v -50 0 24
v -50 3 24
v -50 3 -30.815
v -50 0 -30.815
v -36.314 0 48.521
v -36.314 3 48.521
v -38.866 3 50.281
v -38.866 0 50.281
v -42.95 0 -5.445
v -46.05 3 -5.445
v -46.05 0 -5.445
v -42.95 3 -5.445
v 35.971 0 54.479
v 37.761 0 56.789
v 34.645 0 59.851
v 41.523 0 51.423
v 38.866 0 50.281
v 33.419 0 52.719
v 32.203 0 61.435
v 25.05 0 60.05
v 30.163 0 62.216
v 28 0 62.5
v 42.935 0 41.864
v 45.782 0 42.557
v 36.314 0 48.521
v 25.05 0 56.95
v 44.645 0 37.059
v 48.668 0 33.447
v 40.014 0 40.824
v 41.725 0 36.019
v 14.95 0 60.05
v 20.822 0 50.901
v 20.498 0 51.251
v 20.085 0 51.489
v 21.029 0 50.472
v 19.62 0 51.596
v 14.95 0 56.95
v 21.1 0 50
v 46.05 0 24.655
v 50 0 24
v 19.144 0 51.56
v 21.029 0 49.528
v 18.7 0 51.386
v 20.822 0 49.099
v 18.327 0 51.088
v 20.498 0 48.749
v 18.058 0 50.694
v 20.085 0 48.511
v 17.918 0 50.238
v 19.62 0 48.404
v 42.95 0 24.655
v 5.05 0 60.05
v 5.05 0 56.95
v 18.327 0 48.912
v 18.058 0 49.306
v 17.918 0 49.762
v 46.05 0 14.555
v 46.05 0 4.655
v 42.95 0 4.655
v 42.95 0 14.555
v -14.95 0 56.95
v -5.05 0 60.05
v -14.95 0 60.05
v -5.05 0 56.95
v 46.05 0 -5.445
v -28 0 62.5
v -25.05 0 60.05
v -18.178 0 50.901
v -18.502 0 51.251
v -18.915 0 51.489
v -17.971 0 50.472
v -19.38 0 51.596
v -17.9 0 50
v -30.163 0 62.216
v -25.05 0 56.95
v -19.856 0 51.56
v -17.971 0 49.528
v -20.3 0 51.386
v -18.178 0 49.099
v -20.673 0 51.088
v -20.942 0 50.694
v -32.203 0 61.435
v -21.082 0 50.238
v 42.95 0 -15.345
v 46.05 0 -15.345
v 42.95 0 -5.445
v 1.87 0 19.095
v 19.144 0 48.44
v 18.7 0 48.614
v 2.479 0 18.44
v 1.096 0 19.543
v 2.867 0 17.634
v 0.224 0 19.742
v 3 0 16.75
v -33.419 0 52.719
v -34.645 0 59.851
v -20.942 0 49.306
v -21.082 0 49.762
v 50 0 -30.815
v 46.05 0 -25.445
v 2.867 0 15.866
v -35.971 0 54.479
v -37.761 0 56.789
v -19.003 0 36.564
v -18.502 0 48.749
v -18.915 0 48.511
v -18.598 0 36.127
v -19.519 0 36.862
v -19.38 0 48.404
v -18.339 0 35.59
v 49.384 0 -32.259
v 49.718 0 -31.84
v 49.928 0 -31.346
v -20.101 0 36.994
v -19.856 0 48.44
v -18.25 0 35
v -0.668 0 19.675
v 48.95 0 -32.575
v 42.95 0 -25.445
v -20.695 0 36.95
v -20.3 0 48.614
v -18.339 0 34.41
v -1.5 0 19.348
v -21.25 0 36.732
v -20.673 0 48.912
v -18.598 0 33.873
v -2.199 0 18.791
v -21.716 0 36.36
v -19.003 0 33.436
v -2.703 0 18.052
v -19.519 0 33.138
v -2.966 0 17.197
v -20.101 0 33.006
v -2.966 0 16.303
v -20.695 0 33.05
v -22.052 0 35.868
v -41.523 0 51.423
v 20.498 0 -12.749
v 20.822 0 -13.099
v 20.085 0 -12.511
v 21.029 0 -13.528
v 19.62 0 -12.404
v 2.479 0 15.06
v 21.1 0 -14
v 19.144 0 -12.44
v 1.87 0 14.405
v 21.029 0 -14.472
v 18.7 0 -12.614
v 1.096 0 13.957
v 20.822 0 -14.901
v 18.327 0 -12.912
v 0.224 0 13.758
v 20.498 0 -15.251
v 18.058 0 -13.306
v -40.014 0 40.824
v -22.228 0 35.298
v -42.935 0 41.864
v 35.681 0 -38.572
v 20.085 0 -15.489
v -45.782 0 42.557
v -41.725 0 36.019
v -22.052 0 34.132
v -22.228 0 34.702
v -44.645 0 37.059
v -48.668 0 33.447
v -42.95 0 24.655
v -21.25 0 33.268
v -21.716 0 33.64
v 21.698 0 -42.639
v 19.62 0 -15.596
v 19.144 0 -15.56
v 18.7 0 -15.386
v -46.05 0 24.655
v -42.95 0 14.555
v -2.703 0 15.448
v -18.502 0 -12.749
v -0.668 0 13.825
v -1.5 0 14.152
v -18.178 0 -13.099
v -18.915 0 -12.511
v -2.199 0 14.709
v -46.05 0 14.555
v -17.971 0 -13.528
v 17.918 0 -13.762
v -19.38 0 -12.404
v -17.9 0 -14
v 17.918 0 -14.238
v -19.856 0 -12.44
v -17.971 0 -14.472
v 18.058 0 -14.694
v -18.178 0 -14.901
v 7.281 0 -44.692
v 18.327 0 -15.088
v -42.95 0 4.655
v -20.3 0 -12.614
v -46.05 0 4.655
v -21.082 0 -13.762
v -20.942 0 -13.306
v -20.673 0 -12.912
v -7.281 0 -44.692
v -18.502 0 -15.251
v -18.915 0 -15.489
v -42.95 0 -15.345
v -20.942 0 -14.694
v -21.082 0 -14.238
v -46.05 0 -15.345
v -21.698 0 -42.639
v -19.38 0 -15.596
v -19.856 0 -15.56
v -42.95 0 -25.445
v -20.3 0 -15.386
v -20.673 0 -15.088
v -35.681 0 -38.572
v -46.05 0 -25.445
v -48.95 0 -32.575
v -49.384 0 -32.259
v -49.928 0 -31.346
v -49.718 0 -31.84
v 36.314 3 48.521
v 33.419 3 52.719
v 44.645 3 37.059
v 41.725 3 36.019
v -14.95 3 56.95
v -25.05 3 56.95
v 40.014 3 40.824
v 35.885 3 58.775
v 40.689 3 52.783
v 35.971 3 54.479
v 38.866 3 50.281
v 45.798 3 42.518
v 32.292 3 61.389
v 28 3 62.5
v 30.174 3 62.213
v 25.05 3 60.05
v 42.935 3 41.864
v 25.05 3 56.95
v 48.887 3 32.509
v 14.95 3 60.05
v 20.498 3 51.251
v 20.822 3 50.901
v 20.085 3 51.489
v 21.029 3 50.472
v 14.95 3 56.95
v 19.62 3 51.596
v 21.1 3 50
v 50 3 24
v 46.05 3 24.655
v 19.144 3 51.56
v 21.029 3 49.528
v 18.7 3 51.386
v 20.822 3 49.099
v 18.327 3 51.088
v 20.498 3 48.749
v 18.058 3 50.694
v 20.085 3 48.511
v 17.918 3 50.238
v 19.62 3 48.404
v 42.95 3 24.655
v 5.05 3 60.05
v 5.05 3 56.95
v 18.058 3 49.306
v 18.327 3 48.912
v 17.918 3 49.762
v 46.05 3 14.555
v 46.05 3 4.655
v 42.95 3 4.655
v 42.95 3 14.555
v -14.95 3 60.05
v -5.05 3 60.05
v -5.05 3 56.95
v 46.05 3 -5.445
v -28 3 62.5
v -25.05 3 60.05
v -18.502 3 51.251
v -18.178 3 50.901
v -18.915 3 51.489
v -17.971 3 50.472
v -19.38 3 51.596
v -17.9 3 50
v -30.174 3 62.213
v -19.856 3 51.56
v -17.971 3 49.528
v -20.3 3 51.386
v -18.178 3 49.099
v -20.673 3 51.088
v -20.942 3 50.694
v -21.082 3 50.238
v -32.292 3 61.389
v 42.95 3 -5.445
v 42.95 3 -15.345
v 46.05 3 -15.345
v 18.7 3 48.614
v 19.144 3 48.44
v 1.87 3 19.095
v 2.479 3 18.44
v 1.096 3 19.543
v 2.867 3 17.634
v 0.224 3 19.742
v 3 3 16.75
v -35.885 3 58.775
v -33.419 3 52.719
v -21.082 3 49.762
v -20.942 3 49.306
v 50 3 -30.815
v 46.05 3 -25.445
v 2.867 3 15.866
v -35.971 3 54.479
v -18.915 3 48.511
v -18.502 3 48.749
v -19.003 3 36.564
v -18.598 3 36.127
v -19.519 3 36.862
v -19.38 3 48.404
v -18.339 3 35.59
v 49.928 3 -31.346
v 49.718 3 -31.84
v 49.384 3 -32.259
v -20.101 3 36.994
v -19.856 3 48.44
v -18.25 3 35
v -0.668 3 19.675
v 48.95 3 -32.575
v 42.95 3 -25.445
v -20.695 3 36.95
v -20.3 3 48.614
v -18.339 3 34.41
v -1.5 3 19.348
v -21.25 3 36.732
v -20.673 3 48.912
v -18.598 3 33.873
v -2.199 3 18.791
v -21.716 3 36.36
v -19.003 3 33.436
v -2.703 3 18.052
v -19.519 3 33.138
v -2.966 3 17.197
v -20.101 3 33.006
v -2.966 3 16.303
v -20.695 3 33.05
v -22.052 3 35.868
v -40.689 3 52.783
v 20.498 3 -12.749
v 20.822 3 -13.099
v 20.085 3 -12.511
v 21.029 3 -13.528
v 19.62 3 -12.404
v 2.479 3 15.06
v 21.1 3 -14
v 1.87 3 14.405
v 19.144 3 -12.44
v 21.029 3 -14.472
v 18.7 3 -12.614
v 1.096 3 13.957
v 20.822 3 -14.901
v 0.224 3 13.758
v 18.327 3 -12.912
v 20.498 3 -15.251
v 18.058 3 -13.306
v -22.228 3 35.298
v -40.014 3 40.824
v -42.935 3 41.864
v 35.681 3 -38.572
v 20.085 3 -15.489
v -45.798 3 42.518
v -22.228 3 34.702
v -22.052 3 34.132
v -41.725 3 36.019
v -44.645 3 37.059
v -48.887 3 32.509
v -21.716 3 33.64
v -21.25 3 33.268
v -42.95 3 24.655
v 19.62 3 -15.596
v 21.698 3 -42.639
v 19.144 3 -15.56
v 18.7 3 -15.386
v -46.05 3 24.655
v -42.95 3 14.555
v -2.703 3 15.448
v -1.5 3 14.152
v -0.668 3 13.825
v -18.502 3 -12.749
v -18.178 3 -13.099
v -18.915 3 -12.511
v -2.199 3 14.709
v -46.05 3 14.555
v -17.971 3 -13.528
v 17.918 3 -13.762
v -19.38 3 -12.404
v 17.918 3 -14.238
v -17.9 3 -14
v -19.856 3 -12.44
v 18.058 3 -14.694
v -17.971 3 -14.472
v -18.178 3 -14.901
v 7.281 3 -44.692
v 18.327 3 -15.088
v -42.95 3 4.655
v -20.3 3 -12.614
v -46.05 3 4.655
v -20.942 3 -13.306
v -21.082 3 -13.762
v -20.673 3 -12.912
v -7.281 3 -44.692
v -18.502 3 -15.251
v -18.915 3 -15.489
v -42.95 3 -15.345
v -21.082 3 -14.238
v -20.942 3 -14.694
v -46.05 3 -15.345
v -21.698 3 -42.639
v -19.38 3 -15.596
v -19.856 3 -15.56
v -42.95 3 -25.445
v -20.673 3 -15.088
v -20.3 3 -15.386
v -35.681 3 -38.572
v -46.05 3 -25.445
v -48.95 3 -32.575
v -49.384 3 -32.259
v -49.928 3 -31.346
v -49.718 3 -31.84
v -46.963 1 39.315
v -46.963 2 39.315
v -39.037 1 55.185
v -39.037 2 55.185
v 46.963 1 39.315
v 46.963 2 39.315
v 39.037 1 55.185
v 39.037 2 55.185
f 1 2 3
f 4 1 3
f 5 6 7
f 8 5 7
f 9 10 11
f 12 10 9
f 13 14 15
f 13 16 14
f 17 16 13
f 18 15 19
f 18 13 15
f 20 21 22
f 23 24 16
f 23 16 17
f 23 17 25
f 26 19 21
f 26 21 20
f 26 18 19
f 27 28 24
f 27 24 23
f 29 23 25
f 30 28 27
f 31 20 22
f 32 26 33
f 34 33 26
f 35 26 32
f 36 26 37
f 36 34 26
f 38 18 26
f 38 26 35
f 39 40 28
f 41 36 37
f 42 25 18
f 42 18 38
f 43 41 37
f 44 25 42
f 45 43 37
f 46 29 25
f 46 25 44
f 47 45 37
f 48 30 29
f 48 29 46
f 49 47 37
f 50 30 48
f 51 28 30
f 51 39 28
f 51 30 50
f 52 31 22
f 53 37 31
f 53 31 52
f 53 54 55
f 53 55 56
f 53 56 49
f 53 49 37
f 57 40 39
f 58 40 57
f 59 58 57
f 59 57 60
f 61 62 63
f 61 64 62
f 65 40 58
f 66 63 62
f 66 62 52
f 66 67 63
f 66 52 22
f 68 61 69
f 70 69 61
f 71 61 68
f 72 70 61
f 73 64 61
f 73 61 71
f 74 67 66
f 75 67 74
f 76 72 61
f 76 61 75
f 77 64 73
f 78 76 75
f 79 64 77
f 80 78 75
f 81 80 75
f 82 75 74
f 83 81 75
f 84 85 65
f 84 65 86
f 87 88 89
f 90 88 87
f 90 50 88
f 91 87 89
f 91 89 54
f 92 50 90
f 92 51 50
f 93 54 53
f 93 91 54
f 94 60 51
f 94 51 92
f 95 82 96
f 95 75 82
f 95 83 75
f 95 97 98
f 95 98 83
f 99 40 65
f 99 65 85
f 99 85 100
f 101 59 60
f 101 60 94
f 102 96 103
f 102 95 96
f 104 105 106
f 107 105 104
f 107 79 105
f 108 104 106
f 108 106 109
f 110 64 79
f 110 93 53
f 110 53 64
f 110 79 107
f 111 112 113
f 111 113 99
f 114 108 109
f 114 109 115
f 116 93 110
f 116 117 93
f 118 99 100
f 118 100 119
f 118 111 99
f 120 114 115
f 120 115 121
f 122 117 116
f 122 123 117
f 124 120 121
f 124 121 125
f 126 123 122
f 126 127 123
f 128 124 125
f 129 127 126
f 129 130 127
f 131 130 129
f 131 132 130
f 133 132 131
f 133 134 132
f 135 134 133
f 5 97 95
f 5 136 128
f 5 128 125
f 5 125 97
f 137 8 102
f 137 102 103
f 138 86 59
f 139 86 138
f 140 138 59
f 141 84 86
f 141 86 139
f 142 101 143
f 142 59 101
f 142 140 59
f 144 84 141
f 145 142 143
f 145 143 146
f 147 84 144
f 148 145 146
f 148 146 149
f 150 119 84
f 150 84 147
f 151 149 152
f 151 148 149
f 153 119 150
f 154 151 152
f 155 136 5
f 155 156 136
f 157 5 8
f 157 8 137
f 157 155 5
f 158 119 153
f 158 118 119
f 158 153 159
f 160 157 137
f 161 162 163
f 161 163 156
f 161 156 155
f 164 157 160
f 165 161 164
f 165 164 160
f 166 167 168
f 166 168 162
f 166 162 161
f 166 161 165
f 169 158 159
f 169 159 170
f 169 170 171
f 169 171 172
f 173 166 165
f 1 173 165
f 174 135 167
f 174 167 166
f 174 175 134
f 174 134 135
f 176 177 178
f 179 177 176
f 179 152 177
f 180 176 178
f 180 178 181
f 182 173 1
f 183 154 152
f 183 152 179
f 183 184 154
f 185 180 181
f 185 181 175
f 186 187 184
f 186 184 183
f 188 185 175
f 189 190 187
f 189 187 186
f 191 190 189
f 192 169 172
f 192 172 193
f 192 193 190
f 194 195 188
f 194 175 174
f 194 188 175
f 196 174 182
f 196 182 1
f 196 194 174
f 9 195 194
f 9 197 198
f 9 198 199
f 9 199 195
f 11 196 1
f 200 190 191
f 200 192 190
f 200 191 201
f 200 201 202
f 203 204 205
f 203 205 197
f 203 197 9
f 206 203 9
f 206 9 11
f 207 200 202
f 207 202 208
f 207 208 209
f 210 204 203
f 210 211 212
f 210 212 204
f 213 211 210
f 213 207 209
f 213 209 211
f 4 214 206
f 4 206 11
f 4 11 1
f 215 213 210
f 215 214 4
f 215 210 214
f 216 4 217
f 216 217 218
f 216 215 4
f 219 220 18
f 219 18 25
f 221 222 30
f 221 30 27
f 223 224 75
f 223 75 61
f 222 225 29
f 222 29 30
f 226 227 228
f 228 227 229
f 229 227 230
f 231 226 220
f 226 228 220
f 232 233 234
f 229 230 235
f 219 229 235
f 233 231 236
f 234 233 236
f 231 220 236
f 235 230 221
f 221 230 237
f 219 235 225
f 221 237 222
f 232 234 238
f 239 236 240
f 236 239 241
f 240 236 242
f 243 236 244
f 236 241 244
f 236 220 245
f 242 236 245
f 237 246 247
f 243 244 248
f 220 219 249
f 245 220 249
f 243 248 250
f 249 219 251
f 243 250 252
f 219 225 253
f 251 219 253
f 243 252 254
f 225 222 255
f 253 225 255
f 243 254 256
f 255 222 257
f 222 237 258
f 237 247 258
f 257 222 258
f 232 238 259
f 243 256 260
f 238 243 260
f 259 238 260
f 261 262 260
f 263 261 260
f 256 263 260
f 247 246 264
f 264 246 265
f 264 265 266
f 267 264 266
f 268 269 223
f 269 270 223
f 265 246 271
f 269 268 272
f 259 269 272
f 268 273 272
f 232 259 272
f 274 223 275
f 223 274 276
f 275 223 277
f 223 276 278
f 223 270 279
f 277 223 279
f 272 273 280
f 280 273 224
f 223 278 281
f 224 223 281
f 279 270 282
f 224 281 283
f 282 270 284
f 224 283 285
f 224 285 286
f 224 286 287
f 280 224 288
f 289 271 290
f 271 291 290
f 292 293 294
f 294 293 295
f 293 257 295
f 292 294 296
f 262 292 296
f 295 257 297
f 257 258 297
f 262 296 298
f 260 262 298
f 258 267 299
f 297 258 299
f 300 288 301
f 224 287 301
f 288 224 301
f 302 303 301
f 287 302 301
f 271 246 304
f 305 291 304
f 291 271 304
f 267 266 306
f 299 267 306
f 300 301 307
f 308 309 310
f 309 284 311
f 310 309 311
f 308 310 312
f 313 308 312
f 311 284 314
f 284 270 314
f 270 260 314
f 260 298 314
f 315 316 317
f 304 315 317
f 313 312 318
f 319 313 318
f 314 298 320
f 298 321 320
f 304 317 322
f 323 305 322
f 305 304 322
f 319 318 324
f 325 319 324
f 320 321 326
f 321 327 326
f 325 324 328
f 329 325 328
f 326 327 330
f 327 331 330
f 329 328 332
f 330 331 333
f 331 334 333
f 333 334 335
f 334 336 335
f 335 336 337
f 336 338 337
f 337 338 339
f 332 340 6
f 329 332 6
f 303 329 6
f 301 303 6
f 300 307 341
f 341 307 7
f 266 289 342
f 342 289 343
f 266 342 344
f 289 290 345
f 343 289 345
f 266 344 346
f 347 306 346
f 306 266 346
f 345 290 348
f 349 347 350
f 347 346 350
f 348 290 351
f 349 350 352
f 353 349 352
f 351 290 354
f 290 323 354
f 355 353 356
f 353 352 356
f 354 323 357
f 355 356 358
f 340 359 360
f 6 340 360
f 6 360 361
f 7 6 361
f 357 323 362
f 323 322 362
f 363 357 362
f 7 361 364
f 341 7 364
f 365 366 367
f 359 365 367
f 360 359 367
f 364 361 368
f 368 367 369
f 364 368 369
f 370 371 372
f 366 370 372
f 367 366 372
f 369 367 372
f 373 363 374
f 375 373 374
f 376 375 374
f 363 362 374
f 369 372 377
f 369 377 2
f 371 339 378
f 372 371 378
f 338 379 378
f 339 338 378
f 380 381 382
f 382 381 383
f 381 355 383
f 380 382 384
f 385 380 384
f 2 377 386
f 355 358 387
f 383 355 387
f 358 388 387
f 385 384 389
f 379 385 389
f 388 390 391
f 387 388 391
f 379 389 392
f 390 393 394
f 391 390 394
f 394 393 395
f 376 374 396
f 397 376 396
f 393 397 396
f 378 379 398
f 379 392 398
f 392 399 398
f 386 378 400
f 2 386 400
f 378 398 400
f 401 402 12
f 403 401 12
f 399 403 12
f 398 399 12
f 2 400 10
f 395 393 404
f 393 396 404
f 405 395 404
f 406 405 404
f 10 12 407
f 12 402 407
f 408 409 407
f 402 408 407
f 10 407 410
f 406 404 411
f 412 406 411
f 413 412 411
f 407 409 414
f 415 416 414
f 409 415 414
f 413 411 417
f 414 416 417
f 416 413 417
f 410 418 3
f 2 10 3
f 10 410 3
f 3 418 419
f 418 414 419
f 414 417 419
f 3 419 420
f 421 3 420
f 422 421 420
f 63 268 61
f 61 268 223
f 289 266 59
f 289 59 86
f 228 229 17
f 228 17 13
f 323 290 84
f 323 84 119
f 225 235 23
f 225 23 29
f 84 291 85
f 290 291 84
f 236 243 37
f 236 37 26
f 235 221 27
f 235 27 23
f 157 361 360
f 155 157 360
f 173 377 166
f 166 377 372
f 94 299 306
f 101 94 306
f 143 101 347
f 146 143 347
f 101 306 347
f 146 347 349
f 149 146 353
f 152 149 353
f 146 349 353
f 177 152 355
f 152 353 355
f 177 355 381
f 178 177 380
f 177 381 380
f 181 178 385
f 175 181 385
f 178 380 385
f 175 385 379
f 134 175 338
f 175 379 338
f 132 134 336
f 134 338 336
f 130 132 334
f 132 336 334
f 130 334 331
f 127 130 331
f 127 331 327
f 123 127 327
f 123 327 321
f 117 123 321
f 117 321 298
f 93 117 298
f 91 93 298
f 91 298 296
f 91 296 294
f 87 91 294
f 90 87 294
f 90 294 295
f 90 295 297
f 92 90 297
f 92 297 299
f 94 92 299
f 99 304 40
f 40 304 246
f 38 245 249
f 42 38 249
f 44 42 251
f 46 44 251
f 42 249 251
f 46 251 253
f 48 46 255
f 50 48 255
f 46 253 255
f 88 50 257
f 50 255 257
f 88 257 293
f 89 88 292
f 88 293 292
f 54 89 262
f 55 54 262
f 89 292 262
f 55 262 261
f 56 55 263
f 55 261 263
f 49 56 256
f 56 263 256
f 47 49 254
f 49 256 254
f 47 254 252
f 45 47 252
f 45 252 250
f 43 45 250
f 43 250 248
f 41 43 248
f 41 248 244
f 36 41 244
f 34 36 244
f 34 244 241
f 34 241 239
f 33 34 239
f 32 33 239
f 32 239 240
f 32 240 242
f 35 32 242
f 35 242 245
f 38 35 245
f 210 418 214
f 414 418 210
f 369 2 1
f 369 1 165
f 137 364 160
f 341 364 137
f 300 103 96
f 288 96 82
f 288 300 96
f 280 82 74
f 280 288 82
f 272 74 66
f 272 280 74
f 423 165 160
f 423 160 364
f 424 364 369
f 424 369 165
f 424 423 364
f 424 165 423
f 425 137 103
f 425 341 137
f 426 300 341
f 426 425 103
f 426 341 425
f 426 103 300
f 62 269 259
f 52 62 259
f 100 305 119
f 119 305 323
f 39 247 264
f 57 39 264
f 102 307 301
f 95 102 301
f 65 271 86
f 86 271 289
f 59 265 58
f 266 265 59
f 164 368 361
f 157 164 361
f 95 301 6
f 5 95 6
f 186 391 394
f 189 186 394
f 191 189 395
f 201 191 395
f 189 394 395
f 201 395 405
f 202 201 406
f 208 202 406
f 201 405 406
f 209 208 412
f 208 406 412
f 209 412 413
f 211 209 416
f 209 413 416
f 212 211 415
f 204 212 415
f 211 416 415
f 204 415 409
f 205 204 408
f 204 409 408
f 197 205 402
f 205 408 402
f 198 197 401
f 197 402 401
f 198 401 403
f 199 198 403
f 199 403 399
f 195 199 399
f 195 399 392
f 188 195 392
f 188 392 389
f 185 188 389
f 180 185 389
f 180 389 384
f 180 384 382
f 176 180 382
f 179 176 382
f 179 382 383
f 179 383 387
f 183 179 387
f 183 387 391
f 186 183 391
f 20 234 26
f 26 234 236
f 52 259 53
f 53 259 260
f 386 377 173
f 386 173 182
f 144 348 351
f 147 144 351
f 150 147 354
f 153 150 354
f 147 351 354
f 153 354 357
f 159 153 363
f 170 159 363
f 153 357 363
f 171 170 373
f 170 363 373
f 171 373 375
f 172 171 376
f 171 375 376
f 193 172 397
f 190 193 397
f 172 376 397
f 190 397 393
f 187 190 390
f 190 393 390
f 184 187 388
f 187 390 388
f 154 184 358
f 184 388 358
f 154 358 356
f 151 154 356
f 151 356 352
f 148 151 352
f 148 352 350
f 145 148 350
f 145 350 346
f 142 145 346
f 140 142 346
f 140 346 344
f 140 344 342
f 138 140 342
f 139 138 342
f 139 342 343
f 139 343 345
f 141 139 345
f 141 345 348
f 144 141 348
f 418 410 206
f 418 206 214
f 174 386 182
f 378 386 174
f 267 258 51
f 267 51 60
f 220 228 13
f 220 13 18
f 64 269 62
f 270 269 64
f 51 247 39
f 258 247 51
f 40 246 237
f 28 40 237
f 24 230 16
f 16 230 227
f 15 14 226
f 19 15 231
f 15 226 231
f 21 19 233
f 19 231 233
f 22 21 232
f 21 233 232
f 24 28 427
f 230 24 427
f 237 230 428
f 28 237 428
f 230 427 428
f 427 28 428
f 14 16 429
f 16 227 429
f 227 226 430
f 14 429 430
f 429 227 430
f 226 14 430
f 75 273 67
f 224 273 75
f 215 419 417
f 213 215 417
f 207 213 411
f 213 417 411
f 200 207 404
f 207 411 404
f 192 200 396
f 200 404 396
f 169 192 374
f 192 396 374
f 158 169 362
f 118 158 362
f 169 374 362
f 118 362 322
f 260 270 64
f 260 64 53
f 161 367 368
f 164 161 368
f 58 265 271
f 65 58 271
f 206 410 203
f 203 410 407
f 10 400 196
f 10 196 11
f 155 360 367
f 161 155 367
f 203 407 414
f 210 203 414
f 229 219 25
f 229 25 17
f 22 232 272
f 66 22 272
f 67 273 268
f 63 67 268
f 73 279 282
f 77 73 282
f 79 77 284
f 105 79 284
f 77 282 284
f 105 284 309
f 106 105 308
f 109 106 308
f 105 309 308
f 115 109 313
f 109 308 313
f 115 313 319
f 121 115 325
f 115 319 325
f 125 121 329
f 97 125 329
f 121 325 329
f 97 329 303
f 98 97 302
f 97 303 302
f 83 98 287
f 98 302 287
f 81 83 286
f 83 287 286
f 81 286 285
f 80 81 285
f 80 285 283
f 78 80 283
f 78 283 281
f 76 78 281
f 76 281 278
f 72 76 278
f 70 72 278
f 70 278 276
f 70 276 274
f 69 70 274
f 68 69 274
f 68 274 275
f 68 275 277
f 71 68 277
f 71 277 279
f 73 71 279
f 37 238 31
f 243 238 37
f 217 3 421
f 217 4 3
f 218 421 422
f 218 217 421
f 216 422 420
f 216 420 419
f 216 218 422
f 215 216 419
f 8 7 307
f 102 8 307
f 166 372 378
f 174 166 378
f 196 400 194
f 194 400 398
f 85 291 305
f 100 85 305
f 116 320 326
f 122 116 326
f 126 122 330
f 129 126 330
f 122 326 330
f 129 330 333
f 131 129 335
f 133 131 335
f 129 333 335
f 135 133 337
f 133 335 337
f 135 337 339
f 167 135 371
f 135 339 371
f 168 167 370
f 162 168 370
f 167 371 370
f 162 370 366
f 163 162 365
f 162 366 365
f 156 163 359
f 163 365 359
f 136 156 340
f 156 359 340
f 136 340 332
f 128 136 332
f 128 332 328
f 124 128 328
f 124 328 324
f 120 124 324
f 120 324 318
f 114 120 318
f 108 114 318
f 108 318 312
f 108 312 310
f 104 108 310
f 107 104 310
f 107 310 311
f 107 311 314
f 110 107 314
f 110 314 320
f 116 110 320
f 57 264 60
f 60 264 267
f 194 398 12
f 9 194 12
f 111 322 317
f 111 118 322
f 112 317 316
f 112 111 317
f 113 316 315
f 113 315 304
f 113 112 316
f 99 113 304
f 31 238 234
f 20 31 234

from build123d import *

# Parameters (mm, degrees)
CROQUIS1_W              = 61
CROQUIS1_H              = 100
SALIENTE_EXTRUIR1_DEPTH = 3
SALIENTE_EXTRUIR4_DEPTH = 3
CROQUIS19_W             = 61
CROQUIS19_H             = 5.5
CORTAR_EXTRUIR11_DEPTH  = 10
CORTAR_EXTRUIR7_DEPTH   = 4
REDONDEO3_R             = 2
CROQUIS15_R             = 1.6
CORTAR_EXTRUIR8_DEPTH   = 4.0000001
CROQUIS16_R             = 3
CORTAR_EXTRUIR9_DEPTH   = 4.0000001
CROQUIS17_W             = 3.1
CROQUIS17_H             = 10.1
CORTAR_EXTRUIR10_DEPTH  = 10
CORTAR_EXTRUIR13_DEPTH  = 4.0000001
CROQUIS20_W             = 10.1
CROQUIS20_H             = 3.1
CORTAR_EXTRUIR12_DEPTH  = 10
CROQUIS22_R             = 2
CORTAR_EXTRUIR14_DEPTH  = 10


with BuildPart() as part:
    # Croquis1 → Saliente-Extruir1 (new body)
    with BuildSketch(Plane(origin=(0, 0, 0), x_dir=(1, 0, 0), z_dir=(0, 1, 0))):
        with Locations((0, -18)):
            Rectangle(CROQUIS1_W, CROQUIS1_H)
    extrude(amount=SALIENTE_EXTRUIR1_DEPTH)

    # Croquis7 → Saliente-Extruir4 (add, through all)
    with BuildSketch(Plane(origin=(0, 3, 0), x_dir=(1, 0, 0), z_dir=(0, 1, 0))):
        with BuildLine():
            Line((-50, -62.5), (-50, 32))
            ThreePointArc((-50, 32), (0, 44.950013881), (50, 32))
            Line((50, 32), (50, -62.5))
            Line((50, -62.5), (-50, -62.5))
        make_face()
    extrude(amount=-SALIENTE_EXTRUIR4_DEPTH)

    # Croquis19 → Cortar-Extruir11 (cut)
    with BuildSketch(Plane(origin=(0, 3, 0), x_dir=(1, 0, 0), z_dir=(0, 1, 0))):
        with Locations((0, -65.25)):
            Rectangle(CROQUIS19_W, CROQUIS19_H)
    extrude(amount=-CORTAR_EXTRUIR11_DEPTH, mode=Mode.SUBTRACT)

    # Croquis14 → Cortar-Extruir7 (cut, through all)
    with BuildSketch(Plane(origin=(0, 3, 0), x_dir=(1, 0, 0), z_dir=(0, 1, 0))):
        with BuildLine():
            Line((-50, -24), (-50, -62.5))
            Line((-50, -62.5), (-28, -62.5))
            add(Edge.make_bspline(
                [(-50, -24), (-50, -36), (-40, -62.5), (-28, -62.5)],
                knots=[0, 0, 0, 0, 1, 1, 1, 1], degree=3))
        make_face()
    cortar_extruir7 = extrude(amount=-CORTAR_EXTRUIR7_DEPTH, mode=Mode.SUBTRACT)

    # Redondeo3
    redondeo3_edges = [part.edges().sort_by_distance(p)[0] for p in [
        (-50, 1.5, -32),
        (50, 1.5, -32),
    ]]
    fillet(redondeo3_edges, radius=REDONDEO3_R)

    # Croquis15 → Cortar-Extruir8 (cut, through all)
    with BuildSketch(Plane(origin=(0, 3, 0), x_dir=(1, 0, 0), z_dir=(0, 1, 0))):
        with Locations((-19.5, 14)):
            Circle(CROQUIS15_R)
        with Locations((19.5, 14)):
            Circle(CROQUIS15_R)
        with Locations((-19.5, -50)):
            Circle(CROQUIS15_R)
        with Locations((19.5, -50)):
            Circle(CROQUIS15_R)
    extrude(amount=-CORTAR_EXTRUIR8_DEPTH, mode=Mode.SUBTRACT)

    # Croquis16 → Cortar-Extruir9 (cut, through all)
    with BuildSketch(Plane(origin=(0, 3, 0), x_dir=(1, 0, 0), z_dir=(0, 1, 0))):
        with Locations((0, -16.75)):
            Circle(CROQUIS16_R)
    extrude(amount=-CORTAR_EXTRUIR9_DEPTH, mode=Mode.SUBTRACT)

    # Croquis17 → Cortar-Extruir10 (cut)
    with BuildSketch(Plane(origin=(0, 3, 0), x_dir=(1, 0, 0), z_dir=(0, 1, 0))):
        with Locations((-44.5, 20.395080133)):
            Rectangle(CROQUIS17_W, CROQUIS17_H)
        with Locations((-44.5, 0.395080133)):
            Rectangle(CROQUIS17_W, CROQUIS17_H)
        with Locations((-44.5, -19.604919867)):
            Rectangle(CROQUIS17_W, CROQUIS17_H)
    cortar_extruir10 = extrude(amount=-CORTAR_EXTRUIR10_DEPTH, mode=Mode.SUBTRACT)

    # Croquis21 → Cortar-Extruir13 (cut, through all)
    with BuildSketch(Plane(origin=(0, 3, 0), x_dir=(1, 0, 0), z_dir=(0, 1, 0))):
        Polygon((-44.645093952, -37.058907452), (-42.934664747, -41.863533549), (-40.014205747, -40.823860895), (-41.724634952, -36.019234798), align=None)
        Polygon((-38.866197007, -50.280851683), (-35.970669214, -54.479175015), (-33.418747189, -52.719148317), (-36.314274981, -48.520824985), align=None)
    cortar_extruir13 = extrude(amount=-CORTAR_EXTRUIR13_DEPTH, mode=Mode.SUBTRACT)

    # Simetría1: Cortar-Extruir7, Cortar-Extruir10, Cortar-Extruir13 across plane
    add(cortar_extruir7.mirror(Plane(origin=(0, 0, 0), x_dir=(0, 0, 1), z_dir=(1, 0, 0))), mode=Mode.SUBTRACT)
    add(cortar_extruir10.mirror(Plane(origin=(0, 0, 0), x_dir=(0, 0, 1), z_dir=(1, 0, 0))), mode=Mode.SUBTRACT)
    add(cortar_extruir13.mirror(Plane(origin=(0, 0, 0), x_dir=(0, 0, 1), z_dir=(1, 0, 0))), mode=Mode.SUBTRACT)

    # Croquis20 → Cortar-Extruir12 (cut)
    with BuildSketch(Plane(origin=(0, 3, 0), x_dir=(1, 0, 0), z_dir=(0, 1, 0))):
        with Locations((0, -58.5)):
            Rectangle(CROQUIS20_W, CROQUIS20_H)
        with Locations((20, -58.5)):
            Rectangle(CROQUIS20_W, CROQUIS20_H)
        with Locations((-20, -58.5)):
            Rectangle(CROQUIS20_W, CROQUIS20_H)
    extrude(amount=-CORTAR_EXTRUIR12_DEPTH, mode=Mode.SUBTRACT)

    # Croquis22 → Cortar-Extruir14 (cut)
    with BuildSketch(Plane(origin=(0, 3, 0), x_dir=(1, 0, 0), z_dir=(0, 1, 0))):
        with Locations((-20.25, -35)):
            Circle(CROQUIS22_R)
    extrude(amount=-CORTAR_EXTRUIR14_DEPTH, mode=Mode.SUBTRACT)


solid = part.part
